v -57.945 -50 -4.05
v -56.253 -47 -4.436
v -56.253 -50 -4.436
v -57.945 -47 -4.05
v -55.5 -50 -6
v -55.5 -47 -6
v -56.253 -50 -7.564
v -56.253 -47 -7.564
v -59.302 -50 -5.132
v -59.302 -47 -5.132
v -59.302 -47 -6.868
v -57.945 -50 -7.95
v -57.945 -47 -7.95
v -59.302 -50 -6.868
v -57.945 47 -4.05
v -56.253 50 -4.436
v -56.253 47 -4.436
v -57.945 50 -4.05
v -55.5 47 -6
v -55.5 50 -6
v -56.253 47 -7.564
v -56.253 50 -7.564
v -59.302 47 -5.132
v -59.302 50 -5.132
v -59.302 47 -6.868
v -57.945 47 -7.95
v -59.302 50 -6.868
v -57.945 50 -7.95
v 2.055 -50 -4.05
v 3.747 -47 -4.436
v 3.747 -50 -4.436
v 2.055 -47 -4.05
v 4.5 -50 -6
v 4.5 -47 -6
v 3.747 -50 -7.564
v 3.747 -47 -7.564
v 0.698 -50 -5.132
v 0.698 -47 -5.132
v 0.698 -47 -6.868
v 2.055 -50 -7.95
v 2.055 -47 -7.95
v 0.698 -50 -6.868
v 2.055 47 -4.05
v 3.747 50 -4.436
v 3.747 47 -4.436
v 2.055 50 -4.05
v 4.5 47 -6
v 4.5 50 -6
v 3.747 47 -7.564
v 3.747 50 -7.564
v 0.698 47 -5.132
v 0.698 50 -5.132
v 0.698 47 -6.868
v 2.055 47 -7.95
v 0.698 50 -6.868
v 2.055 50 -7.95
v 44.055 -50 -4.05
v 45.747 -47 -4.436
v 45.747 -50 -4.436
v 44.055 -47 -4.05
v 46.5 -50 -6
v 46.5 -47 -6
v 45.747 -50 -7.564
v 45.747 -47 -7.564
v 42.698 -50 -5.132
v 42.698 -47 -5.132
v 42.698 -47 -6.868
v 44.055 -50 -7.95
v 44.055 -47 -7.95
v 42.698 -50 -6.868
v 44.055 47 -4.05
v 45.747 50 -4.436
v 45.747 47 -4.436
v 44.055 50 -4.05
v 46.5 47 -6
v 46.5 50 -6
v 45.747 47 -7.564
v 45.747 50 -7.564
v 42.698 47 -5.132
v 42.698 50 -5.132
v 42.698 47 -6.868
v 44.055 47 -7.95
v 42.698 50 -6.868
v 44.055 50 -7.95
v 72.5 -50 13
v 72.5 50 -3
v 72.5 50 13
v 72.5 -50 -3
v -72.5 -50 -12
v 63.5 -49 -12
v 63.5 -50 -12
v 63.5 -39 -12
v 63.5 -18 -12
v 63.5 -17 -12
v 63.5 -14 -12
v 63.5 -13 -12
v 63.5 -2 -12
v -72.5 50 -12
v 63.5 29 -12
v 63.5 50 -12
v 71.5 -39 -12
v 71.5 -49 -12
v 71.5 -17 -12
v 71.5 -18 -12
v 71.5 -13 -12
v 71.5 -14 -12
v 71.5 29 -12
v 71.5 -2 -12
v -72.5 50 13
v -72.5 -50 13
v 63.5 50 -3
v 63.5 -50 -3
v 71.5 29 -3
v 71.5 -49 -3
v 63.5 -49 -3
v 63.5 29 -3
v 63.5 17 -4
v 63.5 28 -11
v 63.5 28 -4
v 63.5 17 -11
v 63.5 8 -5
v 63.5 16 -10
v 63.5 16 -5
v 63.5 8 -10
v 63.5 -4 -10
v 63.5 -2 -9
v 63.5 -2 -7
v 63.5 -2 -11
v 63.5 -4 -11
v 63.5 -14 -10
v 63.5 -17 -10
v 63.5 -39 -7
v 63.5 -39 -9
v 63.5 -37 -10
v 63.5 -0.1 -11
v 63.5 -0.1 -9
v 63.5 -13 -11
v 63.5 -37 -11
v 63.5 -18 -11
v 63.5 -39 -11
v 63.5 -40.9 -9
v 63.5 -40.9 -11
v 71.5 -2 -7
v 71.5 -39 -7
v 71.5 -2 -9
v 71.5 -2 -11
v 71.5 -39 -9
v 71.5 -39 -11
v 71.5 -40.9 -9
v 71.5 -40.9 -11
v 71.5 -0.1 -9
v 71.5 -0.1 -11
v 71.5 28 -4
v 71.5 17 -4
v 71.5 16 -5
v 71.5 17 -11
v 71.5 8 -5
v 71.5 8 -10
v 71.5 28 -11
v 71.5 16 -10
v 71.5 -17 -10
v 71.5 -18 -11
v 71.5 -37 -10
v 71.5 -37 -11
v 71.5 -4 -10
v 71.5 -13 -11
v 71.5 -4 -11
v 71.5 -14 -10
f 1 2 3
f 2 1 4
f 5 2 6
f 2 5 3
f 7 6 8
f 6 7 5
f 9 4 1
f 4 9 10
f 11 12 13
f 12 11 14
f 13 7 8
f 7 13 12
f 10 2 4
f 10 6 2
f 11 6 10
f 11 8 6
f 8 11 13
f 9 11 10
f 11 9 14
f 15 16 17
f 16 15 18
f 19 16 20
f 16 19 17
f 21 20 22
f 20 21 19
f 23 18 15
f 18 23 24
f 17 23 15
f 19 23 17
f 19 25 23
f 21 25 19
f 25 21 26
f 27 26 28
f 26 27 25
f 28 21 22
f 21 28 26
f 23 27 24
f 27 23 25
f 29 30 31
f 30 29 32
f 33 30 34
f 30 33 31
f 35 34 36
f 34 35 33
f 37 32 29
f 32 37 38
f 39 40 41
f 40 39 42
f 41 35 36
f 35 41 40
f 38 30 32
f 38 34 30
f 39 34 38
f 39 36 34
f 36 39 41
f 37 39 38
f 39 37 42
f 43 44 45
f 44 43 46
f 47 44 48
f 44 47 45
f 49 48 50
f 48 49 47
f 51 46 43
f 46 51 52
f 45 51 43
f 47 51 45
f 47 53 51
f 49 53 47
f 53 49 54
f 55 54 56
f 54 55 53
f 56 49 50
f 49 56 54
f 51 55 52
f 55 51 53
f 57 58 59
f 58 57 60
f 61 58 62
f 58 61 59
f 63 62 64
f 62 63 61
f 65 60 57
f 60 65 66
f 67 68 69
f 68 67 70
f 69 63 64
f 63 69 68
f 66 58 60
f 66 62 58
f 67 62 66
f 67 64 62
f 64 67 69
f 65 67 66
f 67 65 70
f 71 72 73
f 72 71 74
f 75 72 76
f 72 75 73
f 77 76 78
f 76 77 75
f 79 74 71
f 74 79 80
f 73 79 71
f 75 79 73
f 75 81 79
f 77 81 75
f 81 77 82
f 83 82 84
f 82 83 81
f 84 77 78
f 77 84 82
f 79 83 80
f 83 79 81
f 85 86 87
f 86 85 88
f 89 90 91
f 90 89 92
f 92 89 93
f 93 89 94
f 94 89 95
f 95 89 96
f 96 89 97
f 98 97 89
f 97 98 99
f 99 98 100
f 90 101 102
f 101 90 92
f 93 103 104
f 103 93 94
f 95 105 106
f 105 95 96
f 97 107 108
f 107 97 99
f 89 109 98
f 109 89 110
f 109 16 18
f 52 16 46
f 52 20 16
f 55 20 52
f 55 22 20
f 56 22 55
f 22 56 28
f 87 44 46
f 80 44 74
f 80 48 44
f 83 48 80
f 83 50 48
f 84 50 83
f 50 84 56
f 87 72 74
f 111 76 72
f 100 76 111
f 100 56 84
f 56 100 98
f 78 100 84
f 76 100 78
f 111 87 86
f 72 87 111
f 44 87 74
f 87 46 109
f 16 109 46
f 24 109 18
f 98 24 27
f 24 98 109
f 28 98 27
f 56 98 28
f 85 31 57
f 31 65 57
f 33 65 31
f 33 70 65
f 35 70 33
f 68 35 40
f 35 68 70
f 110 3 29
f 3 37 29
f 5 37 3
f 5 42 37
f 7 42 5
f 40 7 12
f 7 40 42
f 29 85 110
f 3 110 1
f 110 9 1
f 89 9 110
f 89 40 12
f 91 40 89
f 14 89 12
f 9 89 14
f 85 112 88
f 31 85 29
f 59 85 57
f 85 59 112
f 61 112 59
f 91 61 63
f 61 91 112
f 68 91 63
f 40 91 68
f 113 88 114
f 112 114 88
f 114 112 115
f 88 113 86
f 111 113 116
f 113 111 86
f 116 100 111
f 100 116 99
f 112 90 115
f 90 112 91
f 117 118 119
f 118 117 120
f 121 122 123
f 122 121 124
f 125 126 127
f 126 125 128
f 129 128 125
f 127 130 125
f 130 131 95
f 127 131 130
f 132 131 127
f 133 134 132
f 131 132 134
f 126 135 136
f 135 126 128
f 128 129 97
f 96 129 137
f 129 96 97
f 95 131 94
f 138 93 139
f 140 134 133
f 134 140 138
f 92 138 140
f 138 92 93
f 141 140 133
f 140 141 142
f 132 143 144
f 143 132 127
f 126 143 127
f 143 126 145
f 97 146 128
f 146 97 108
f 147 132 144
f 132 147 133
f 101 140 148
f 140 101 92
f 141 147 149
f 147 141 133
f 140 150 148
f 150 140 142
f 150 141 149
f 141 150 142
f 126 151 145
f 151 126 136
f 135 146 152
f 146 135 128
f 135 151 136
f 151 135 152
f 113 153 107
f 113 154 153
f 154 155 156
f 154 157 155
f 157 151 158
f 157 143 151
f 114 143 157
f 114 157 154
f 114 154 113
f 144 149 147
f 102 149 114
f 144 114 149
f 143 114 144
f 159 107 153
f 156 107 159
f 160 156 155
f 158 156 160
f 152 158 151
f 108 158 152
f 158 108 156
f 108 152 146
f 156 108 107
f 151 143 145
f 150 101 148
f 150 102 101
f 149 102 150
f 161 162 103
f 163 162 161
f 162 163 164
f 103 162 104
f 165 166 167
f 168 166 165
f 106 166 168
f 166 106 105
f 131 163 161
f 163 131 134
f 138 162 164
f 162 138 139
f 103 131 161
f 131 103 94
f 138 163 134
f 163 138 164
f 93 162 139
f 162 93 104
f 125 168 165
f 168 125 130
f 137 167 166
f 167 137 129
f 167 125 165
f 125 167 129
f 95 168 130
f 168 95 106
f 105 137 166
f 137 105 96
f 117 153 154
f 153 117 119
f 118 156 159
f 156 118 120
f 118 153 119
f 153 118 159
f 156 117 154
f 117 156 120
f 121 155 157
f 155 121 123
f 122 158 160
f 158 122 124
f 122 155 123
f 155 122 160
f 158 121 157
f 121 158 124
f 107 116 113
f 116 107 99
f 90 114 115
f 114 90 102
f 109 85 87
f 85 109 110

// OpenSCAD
module HardDriveEnclosure() {
  translate([-72.5,-50,-12]) {
    union() {
      // main body
      difference() {
        // metal box
        color("dimgray") cube([145,100,24]);
        // gap for connector block
        translate([136,-1,-1]) cube([10,102,10]);
        // screw holes 
        union() {
          // three holes on each side
          for (x = [15,75,117]) {
            // side 1
            translate([x,0,6]) rotate([90,0,0]) cylinder(h=6,r=2,center=true);
            // side 2
            translate([x,100,6]) rotate([90,0,0]) cylinder(h=6,r=2,center=true);
          }
        }
      }
      // connector block
      translate([136,1,0]) {
        difference() {
          // main body
          color("dimgray") cube([8,78,9]);
          // hols 'n gaps
          union() {
            // right pin hole
            translate([0,66,1]) cube([9,11,7]);
            // hole left of right pin hole
            translate([0,57,2]) cube([9,8,5]);
            // sata connectors
            translate([0,10,-1]) {
              difference() {
                // hole for sata connectors
                union() {
                  cube([9,37,6]);
                  translate([0,-1.9,2]) cube([9,2,2]);
                  translate([0,36.9,2]) cube([9,2,2]);
                }
                // bridges of sata connectors
                union() {
                  // sata data connector
                  union() {
                    translate([0,2,2]) cube([8,20,1]);
                    translate([0,21,1]) cube([8,1,1]);
                  }
                  // sata power connector
                  union() {
                    translate([0,25,2]) cube([8,10,1]);
                    translate([0,25,1]) cube([8,1,1]);
                  }
                }
              }
            }
          }
        }
      }
      // metal lid
      translate([0,0,24]) color("silver") cube([145,100,1]);
    }
  }
}

HardDriveEnclosure();
